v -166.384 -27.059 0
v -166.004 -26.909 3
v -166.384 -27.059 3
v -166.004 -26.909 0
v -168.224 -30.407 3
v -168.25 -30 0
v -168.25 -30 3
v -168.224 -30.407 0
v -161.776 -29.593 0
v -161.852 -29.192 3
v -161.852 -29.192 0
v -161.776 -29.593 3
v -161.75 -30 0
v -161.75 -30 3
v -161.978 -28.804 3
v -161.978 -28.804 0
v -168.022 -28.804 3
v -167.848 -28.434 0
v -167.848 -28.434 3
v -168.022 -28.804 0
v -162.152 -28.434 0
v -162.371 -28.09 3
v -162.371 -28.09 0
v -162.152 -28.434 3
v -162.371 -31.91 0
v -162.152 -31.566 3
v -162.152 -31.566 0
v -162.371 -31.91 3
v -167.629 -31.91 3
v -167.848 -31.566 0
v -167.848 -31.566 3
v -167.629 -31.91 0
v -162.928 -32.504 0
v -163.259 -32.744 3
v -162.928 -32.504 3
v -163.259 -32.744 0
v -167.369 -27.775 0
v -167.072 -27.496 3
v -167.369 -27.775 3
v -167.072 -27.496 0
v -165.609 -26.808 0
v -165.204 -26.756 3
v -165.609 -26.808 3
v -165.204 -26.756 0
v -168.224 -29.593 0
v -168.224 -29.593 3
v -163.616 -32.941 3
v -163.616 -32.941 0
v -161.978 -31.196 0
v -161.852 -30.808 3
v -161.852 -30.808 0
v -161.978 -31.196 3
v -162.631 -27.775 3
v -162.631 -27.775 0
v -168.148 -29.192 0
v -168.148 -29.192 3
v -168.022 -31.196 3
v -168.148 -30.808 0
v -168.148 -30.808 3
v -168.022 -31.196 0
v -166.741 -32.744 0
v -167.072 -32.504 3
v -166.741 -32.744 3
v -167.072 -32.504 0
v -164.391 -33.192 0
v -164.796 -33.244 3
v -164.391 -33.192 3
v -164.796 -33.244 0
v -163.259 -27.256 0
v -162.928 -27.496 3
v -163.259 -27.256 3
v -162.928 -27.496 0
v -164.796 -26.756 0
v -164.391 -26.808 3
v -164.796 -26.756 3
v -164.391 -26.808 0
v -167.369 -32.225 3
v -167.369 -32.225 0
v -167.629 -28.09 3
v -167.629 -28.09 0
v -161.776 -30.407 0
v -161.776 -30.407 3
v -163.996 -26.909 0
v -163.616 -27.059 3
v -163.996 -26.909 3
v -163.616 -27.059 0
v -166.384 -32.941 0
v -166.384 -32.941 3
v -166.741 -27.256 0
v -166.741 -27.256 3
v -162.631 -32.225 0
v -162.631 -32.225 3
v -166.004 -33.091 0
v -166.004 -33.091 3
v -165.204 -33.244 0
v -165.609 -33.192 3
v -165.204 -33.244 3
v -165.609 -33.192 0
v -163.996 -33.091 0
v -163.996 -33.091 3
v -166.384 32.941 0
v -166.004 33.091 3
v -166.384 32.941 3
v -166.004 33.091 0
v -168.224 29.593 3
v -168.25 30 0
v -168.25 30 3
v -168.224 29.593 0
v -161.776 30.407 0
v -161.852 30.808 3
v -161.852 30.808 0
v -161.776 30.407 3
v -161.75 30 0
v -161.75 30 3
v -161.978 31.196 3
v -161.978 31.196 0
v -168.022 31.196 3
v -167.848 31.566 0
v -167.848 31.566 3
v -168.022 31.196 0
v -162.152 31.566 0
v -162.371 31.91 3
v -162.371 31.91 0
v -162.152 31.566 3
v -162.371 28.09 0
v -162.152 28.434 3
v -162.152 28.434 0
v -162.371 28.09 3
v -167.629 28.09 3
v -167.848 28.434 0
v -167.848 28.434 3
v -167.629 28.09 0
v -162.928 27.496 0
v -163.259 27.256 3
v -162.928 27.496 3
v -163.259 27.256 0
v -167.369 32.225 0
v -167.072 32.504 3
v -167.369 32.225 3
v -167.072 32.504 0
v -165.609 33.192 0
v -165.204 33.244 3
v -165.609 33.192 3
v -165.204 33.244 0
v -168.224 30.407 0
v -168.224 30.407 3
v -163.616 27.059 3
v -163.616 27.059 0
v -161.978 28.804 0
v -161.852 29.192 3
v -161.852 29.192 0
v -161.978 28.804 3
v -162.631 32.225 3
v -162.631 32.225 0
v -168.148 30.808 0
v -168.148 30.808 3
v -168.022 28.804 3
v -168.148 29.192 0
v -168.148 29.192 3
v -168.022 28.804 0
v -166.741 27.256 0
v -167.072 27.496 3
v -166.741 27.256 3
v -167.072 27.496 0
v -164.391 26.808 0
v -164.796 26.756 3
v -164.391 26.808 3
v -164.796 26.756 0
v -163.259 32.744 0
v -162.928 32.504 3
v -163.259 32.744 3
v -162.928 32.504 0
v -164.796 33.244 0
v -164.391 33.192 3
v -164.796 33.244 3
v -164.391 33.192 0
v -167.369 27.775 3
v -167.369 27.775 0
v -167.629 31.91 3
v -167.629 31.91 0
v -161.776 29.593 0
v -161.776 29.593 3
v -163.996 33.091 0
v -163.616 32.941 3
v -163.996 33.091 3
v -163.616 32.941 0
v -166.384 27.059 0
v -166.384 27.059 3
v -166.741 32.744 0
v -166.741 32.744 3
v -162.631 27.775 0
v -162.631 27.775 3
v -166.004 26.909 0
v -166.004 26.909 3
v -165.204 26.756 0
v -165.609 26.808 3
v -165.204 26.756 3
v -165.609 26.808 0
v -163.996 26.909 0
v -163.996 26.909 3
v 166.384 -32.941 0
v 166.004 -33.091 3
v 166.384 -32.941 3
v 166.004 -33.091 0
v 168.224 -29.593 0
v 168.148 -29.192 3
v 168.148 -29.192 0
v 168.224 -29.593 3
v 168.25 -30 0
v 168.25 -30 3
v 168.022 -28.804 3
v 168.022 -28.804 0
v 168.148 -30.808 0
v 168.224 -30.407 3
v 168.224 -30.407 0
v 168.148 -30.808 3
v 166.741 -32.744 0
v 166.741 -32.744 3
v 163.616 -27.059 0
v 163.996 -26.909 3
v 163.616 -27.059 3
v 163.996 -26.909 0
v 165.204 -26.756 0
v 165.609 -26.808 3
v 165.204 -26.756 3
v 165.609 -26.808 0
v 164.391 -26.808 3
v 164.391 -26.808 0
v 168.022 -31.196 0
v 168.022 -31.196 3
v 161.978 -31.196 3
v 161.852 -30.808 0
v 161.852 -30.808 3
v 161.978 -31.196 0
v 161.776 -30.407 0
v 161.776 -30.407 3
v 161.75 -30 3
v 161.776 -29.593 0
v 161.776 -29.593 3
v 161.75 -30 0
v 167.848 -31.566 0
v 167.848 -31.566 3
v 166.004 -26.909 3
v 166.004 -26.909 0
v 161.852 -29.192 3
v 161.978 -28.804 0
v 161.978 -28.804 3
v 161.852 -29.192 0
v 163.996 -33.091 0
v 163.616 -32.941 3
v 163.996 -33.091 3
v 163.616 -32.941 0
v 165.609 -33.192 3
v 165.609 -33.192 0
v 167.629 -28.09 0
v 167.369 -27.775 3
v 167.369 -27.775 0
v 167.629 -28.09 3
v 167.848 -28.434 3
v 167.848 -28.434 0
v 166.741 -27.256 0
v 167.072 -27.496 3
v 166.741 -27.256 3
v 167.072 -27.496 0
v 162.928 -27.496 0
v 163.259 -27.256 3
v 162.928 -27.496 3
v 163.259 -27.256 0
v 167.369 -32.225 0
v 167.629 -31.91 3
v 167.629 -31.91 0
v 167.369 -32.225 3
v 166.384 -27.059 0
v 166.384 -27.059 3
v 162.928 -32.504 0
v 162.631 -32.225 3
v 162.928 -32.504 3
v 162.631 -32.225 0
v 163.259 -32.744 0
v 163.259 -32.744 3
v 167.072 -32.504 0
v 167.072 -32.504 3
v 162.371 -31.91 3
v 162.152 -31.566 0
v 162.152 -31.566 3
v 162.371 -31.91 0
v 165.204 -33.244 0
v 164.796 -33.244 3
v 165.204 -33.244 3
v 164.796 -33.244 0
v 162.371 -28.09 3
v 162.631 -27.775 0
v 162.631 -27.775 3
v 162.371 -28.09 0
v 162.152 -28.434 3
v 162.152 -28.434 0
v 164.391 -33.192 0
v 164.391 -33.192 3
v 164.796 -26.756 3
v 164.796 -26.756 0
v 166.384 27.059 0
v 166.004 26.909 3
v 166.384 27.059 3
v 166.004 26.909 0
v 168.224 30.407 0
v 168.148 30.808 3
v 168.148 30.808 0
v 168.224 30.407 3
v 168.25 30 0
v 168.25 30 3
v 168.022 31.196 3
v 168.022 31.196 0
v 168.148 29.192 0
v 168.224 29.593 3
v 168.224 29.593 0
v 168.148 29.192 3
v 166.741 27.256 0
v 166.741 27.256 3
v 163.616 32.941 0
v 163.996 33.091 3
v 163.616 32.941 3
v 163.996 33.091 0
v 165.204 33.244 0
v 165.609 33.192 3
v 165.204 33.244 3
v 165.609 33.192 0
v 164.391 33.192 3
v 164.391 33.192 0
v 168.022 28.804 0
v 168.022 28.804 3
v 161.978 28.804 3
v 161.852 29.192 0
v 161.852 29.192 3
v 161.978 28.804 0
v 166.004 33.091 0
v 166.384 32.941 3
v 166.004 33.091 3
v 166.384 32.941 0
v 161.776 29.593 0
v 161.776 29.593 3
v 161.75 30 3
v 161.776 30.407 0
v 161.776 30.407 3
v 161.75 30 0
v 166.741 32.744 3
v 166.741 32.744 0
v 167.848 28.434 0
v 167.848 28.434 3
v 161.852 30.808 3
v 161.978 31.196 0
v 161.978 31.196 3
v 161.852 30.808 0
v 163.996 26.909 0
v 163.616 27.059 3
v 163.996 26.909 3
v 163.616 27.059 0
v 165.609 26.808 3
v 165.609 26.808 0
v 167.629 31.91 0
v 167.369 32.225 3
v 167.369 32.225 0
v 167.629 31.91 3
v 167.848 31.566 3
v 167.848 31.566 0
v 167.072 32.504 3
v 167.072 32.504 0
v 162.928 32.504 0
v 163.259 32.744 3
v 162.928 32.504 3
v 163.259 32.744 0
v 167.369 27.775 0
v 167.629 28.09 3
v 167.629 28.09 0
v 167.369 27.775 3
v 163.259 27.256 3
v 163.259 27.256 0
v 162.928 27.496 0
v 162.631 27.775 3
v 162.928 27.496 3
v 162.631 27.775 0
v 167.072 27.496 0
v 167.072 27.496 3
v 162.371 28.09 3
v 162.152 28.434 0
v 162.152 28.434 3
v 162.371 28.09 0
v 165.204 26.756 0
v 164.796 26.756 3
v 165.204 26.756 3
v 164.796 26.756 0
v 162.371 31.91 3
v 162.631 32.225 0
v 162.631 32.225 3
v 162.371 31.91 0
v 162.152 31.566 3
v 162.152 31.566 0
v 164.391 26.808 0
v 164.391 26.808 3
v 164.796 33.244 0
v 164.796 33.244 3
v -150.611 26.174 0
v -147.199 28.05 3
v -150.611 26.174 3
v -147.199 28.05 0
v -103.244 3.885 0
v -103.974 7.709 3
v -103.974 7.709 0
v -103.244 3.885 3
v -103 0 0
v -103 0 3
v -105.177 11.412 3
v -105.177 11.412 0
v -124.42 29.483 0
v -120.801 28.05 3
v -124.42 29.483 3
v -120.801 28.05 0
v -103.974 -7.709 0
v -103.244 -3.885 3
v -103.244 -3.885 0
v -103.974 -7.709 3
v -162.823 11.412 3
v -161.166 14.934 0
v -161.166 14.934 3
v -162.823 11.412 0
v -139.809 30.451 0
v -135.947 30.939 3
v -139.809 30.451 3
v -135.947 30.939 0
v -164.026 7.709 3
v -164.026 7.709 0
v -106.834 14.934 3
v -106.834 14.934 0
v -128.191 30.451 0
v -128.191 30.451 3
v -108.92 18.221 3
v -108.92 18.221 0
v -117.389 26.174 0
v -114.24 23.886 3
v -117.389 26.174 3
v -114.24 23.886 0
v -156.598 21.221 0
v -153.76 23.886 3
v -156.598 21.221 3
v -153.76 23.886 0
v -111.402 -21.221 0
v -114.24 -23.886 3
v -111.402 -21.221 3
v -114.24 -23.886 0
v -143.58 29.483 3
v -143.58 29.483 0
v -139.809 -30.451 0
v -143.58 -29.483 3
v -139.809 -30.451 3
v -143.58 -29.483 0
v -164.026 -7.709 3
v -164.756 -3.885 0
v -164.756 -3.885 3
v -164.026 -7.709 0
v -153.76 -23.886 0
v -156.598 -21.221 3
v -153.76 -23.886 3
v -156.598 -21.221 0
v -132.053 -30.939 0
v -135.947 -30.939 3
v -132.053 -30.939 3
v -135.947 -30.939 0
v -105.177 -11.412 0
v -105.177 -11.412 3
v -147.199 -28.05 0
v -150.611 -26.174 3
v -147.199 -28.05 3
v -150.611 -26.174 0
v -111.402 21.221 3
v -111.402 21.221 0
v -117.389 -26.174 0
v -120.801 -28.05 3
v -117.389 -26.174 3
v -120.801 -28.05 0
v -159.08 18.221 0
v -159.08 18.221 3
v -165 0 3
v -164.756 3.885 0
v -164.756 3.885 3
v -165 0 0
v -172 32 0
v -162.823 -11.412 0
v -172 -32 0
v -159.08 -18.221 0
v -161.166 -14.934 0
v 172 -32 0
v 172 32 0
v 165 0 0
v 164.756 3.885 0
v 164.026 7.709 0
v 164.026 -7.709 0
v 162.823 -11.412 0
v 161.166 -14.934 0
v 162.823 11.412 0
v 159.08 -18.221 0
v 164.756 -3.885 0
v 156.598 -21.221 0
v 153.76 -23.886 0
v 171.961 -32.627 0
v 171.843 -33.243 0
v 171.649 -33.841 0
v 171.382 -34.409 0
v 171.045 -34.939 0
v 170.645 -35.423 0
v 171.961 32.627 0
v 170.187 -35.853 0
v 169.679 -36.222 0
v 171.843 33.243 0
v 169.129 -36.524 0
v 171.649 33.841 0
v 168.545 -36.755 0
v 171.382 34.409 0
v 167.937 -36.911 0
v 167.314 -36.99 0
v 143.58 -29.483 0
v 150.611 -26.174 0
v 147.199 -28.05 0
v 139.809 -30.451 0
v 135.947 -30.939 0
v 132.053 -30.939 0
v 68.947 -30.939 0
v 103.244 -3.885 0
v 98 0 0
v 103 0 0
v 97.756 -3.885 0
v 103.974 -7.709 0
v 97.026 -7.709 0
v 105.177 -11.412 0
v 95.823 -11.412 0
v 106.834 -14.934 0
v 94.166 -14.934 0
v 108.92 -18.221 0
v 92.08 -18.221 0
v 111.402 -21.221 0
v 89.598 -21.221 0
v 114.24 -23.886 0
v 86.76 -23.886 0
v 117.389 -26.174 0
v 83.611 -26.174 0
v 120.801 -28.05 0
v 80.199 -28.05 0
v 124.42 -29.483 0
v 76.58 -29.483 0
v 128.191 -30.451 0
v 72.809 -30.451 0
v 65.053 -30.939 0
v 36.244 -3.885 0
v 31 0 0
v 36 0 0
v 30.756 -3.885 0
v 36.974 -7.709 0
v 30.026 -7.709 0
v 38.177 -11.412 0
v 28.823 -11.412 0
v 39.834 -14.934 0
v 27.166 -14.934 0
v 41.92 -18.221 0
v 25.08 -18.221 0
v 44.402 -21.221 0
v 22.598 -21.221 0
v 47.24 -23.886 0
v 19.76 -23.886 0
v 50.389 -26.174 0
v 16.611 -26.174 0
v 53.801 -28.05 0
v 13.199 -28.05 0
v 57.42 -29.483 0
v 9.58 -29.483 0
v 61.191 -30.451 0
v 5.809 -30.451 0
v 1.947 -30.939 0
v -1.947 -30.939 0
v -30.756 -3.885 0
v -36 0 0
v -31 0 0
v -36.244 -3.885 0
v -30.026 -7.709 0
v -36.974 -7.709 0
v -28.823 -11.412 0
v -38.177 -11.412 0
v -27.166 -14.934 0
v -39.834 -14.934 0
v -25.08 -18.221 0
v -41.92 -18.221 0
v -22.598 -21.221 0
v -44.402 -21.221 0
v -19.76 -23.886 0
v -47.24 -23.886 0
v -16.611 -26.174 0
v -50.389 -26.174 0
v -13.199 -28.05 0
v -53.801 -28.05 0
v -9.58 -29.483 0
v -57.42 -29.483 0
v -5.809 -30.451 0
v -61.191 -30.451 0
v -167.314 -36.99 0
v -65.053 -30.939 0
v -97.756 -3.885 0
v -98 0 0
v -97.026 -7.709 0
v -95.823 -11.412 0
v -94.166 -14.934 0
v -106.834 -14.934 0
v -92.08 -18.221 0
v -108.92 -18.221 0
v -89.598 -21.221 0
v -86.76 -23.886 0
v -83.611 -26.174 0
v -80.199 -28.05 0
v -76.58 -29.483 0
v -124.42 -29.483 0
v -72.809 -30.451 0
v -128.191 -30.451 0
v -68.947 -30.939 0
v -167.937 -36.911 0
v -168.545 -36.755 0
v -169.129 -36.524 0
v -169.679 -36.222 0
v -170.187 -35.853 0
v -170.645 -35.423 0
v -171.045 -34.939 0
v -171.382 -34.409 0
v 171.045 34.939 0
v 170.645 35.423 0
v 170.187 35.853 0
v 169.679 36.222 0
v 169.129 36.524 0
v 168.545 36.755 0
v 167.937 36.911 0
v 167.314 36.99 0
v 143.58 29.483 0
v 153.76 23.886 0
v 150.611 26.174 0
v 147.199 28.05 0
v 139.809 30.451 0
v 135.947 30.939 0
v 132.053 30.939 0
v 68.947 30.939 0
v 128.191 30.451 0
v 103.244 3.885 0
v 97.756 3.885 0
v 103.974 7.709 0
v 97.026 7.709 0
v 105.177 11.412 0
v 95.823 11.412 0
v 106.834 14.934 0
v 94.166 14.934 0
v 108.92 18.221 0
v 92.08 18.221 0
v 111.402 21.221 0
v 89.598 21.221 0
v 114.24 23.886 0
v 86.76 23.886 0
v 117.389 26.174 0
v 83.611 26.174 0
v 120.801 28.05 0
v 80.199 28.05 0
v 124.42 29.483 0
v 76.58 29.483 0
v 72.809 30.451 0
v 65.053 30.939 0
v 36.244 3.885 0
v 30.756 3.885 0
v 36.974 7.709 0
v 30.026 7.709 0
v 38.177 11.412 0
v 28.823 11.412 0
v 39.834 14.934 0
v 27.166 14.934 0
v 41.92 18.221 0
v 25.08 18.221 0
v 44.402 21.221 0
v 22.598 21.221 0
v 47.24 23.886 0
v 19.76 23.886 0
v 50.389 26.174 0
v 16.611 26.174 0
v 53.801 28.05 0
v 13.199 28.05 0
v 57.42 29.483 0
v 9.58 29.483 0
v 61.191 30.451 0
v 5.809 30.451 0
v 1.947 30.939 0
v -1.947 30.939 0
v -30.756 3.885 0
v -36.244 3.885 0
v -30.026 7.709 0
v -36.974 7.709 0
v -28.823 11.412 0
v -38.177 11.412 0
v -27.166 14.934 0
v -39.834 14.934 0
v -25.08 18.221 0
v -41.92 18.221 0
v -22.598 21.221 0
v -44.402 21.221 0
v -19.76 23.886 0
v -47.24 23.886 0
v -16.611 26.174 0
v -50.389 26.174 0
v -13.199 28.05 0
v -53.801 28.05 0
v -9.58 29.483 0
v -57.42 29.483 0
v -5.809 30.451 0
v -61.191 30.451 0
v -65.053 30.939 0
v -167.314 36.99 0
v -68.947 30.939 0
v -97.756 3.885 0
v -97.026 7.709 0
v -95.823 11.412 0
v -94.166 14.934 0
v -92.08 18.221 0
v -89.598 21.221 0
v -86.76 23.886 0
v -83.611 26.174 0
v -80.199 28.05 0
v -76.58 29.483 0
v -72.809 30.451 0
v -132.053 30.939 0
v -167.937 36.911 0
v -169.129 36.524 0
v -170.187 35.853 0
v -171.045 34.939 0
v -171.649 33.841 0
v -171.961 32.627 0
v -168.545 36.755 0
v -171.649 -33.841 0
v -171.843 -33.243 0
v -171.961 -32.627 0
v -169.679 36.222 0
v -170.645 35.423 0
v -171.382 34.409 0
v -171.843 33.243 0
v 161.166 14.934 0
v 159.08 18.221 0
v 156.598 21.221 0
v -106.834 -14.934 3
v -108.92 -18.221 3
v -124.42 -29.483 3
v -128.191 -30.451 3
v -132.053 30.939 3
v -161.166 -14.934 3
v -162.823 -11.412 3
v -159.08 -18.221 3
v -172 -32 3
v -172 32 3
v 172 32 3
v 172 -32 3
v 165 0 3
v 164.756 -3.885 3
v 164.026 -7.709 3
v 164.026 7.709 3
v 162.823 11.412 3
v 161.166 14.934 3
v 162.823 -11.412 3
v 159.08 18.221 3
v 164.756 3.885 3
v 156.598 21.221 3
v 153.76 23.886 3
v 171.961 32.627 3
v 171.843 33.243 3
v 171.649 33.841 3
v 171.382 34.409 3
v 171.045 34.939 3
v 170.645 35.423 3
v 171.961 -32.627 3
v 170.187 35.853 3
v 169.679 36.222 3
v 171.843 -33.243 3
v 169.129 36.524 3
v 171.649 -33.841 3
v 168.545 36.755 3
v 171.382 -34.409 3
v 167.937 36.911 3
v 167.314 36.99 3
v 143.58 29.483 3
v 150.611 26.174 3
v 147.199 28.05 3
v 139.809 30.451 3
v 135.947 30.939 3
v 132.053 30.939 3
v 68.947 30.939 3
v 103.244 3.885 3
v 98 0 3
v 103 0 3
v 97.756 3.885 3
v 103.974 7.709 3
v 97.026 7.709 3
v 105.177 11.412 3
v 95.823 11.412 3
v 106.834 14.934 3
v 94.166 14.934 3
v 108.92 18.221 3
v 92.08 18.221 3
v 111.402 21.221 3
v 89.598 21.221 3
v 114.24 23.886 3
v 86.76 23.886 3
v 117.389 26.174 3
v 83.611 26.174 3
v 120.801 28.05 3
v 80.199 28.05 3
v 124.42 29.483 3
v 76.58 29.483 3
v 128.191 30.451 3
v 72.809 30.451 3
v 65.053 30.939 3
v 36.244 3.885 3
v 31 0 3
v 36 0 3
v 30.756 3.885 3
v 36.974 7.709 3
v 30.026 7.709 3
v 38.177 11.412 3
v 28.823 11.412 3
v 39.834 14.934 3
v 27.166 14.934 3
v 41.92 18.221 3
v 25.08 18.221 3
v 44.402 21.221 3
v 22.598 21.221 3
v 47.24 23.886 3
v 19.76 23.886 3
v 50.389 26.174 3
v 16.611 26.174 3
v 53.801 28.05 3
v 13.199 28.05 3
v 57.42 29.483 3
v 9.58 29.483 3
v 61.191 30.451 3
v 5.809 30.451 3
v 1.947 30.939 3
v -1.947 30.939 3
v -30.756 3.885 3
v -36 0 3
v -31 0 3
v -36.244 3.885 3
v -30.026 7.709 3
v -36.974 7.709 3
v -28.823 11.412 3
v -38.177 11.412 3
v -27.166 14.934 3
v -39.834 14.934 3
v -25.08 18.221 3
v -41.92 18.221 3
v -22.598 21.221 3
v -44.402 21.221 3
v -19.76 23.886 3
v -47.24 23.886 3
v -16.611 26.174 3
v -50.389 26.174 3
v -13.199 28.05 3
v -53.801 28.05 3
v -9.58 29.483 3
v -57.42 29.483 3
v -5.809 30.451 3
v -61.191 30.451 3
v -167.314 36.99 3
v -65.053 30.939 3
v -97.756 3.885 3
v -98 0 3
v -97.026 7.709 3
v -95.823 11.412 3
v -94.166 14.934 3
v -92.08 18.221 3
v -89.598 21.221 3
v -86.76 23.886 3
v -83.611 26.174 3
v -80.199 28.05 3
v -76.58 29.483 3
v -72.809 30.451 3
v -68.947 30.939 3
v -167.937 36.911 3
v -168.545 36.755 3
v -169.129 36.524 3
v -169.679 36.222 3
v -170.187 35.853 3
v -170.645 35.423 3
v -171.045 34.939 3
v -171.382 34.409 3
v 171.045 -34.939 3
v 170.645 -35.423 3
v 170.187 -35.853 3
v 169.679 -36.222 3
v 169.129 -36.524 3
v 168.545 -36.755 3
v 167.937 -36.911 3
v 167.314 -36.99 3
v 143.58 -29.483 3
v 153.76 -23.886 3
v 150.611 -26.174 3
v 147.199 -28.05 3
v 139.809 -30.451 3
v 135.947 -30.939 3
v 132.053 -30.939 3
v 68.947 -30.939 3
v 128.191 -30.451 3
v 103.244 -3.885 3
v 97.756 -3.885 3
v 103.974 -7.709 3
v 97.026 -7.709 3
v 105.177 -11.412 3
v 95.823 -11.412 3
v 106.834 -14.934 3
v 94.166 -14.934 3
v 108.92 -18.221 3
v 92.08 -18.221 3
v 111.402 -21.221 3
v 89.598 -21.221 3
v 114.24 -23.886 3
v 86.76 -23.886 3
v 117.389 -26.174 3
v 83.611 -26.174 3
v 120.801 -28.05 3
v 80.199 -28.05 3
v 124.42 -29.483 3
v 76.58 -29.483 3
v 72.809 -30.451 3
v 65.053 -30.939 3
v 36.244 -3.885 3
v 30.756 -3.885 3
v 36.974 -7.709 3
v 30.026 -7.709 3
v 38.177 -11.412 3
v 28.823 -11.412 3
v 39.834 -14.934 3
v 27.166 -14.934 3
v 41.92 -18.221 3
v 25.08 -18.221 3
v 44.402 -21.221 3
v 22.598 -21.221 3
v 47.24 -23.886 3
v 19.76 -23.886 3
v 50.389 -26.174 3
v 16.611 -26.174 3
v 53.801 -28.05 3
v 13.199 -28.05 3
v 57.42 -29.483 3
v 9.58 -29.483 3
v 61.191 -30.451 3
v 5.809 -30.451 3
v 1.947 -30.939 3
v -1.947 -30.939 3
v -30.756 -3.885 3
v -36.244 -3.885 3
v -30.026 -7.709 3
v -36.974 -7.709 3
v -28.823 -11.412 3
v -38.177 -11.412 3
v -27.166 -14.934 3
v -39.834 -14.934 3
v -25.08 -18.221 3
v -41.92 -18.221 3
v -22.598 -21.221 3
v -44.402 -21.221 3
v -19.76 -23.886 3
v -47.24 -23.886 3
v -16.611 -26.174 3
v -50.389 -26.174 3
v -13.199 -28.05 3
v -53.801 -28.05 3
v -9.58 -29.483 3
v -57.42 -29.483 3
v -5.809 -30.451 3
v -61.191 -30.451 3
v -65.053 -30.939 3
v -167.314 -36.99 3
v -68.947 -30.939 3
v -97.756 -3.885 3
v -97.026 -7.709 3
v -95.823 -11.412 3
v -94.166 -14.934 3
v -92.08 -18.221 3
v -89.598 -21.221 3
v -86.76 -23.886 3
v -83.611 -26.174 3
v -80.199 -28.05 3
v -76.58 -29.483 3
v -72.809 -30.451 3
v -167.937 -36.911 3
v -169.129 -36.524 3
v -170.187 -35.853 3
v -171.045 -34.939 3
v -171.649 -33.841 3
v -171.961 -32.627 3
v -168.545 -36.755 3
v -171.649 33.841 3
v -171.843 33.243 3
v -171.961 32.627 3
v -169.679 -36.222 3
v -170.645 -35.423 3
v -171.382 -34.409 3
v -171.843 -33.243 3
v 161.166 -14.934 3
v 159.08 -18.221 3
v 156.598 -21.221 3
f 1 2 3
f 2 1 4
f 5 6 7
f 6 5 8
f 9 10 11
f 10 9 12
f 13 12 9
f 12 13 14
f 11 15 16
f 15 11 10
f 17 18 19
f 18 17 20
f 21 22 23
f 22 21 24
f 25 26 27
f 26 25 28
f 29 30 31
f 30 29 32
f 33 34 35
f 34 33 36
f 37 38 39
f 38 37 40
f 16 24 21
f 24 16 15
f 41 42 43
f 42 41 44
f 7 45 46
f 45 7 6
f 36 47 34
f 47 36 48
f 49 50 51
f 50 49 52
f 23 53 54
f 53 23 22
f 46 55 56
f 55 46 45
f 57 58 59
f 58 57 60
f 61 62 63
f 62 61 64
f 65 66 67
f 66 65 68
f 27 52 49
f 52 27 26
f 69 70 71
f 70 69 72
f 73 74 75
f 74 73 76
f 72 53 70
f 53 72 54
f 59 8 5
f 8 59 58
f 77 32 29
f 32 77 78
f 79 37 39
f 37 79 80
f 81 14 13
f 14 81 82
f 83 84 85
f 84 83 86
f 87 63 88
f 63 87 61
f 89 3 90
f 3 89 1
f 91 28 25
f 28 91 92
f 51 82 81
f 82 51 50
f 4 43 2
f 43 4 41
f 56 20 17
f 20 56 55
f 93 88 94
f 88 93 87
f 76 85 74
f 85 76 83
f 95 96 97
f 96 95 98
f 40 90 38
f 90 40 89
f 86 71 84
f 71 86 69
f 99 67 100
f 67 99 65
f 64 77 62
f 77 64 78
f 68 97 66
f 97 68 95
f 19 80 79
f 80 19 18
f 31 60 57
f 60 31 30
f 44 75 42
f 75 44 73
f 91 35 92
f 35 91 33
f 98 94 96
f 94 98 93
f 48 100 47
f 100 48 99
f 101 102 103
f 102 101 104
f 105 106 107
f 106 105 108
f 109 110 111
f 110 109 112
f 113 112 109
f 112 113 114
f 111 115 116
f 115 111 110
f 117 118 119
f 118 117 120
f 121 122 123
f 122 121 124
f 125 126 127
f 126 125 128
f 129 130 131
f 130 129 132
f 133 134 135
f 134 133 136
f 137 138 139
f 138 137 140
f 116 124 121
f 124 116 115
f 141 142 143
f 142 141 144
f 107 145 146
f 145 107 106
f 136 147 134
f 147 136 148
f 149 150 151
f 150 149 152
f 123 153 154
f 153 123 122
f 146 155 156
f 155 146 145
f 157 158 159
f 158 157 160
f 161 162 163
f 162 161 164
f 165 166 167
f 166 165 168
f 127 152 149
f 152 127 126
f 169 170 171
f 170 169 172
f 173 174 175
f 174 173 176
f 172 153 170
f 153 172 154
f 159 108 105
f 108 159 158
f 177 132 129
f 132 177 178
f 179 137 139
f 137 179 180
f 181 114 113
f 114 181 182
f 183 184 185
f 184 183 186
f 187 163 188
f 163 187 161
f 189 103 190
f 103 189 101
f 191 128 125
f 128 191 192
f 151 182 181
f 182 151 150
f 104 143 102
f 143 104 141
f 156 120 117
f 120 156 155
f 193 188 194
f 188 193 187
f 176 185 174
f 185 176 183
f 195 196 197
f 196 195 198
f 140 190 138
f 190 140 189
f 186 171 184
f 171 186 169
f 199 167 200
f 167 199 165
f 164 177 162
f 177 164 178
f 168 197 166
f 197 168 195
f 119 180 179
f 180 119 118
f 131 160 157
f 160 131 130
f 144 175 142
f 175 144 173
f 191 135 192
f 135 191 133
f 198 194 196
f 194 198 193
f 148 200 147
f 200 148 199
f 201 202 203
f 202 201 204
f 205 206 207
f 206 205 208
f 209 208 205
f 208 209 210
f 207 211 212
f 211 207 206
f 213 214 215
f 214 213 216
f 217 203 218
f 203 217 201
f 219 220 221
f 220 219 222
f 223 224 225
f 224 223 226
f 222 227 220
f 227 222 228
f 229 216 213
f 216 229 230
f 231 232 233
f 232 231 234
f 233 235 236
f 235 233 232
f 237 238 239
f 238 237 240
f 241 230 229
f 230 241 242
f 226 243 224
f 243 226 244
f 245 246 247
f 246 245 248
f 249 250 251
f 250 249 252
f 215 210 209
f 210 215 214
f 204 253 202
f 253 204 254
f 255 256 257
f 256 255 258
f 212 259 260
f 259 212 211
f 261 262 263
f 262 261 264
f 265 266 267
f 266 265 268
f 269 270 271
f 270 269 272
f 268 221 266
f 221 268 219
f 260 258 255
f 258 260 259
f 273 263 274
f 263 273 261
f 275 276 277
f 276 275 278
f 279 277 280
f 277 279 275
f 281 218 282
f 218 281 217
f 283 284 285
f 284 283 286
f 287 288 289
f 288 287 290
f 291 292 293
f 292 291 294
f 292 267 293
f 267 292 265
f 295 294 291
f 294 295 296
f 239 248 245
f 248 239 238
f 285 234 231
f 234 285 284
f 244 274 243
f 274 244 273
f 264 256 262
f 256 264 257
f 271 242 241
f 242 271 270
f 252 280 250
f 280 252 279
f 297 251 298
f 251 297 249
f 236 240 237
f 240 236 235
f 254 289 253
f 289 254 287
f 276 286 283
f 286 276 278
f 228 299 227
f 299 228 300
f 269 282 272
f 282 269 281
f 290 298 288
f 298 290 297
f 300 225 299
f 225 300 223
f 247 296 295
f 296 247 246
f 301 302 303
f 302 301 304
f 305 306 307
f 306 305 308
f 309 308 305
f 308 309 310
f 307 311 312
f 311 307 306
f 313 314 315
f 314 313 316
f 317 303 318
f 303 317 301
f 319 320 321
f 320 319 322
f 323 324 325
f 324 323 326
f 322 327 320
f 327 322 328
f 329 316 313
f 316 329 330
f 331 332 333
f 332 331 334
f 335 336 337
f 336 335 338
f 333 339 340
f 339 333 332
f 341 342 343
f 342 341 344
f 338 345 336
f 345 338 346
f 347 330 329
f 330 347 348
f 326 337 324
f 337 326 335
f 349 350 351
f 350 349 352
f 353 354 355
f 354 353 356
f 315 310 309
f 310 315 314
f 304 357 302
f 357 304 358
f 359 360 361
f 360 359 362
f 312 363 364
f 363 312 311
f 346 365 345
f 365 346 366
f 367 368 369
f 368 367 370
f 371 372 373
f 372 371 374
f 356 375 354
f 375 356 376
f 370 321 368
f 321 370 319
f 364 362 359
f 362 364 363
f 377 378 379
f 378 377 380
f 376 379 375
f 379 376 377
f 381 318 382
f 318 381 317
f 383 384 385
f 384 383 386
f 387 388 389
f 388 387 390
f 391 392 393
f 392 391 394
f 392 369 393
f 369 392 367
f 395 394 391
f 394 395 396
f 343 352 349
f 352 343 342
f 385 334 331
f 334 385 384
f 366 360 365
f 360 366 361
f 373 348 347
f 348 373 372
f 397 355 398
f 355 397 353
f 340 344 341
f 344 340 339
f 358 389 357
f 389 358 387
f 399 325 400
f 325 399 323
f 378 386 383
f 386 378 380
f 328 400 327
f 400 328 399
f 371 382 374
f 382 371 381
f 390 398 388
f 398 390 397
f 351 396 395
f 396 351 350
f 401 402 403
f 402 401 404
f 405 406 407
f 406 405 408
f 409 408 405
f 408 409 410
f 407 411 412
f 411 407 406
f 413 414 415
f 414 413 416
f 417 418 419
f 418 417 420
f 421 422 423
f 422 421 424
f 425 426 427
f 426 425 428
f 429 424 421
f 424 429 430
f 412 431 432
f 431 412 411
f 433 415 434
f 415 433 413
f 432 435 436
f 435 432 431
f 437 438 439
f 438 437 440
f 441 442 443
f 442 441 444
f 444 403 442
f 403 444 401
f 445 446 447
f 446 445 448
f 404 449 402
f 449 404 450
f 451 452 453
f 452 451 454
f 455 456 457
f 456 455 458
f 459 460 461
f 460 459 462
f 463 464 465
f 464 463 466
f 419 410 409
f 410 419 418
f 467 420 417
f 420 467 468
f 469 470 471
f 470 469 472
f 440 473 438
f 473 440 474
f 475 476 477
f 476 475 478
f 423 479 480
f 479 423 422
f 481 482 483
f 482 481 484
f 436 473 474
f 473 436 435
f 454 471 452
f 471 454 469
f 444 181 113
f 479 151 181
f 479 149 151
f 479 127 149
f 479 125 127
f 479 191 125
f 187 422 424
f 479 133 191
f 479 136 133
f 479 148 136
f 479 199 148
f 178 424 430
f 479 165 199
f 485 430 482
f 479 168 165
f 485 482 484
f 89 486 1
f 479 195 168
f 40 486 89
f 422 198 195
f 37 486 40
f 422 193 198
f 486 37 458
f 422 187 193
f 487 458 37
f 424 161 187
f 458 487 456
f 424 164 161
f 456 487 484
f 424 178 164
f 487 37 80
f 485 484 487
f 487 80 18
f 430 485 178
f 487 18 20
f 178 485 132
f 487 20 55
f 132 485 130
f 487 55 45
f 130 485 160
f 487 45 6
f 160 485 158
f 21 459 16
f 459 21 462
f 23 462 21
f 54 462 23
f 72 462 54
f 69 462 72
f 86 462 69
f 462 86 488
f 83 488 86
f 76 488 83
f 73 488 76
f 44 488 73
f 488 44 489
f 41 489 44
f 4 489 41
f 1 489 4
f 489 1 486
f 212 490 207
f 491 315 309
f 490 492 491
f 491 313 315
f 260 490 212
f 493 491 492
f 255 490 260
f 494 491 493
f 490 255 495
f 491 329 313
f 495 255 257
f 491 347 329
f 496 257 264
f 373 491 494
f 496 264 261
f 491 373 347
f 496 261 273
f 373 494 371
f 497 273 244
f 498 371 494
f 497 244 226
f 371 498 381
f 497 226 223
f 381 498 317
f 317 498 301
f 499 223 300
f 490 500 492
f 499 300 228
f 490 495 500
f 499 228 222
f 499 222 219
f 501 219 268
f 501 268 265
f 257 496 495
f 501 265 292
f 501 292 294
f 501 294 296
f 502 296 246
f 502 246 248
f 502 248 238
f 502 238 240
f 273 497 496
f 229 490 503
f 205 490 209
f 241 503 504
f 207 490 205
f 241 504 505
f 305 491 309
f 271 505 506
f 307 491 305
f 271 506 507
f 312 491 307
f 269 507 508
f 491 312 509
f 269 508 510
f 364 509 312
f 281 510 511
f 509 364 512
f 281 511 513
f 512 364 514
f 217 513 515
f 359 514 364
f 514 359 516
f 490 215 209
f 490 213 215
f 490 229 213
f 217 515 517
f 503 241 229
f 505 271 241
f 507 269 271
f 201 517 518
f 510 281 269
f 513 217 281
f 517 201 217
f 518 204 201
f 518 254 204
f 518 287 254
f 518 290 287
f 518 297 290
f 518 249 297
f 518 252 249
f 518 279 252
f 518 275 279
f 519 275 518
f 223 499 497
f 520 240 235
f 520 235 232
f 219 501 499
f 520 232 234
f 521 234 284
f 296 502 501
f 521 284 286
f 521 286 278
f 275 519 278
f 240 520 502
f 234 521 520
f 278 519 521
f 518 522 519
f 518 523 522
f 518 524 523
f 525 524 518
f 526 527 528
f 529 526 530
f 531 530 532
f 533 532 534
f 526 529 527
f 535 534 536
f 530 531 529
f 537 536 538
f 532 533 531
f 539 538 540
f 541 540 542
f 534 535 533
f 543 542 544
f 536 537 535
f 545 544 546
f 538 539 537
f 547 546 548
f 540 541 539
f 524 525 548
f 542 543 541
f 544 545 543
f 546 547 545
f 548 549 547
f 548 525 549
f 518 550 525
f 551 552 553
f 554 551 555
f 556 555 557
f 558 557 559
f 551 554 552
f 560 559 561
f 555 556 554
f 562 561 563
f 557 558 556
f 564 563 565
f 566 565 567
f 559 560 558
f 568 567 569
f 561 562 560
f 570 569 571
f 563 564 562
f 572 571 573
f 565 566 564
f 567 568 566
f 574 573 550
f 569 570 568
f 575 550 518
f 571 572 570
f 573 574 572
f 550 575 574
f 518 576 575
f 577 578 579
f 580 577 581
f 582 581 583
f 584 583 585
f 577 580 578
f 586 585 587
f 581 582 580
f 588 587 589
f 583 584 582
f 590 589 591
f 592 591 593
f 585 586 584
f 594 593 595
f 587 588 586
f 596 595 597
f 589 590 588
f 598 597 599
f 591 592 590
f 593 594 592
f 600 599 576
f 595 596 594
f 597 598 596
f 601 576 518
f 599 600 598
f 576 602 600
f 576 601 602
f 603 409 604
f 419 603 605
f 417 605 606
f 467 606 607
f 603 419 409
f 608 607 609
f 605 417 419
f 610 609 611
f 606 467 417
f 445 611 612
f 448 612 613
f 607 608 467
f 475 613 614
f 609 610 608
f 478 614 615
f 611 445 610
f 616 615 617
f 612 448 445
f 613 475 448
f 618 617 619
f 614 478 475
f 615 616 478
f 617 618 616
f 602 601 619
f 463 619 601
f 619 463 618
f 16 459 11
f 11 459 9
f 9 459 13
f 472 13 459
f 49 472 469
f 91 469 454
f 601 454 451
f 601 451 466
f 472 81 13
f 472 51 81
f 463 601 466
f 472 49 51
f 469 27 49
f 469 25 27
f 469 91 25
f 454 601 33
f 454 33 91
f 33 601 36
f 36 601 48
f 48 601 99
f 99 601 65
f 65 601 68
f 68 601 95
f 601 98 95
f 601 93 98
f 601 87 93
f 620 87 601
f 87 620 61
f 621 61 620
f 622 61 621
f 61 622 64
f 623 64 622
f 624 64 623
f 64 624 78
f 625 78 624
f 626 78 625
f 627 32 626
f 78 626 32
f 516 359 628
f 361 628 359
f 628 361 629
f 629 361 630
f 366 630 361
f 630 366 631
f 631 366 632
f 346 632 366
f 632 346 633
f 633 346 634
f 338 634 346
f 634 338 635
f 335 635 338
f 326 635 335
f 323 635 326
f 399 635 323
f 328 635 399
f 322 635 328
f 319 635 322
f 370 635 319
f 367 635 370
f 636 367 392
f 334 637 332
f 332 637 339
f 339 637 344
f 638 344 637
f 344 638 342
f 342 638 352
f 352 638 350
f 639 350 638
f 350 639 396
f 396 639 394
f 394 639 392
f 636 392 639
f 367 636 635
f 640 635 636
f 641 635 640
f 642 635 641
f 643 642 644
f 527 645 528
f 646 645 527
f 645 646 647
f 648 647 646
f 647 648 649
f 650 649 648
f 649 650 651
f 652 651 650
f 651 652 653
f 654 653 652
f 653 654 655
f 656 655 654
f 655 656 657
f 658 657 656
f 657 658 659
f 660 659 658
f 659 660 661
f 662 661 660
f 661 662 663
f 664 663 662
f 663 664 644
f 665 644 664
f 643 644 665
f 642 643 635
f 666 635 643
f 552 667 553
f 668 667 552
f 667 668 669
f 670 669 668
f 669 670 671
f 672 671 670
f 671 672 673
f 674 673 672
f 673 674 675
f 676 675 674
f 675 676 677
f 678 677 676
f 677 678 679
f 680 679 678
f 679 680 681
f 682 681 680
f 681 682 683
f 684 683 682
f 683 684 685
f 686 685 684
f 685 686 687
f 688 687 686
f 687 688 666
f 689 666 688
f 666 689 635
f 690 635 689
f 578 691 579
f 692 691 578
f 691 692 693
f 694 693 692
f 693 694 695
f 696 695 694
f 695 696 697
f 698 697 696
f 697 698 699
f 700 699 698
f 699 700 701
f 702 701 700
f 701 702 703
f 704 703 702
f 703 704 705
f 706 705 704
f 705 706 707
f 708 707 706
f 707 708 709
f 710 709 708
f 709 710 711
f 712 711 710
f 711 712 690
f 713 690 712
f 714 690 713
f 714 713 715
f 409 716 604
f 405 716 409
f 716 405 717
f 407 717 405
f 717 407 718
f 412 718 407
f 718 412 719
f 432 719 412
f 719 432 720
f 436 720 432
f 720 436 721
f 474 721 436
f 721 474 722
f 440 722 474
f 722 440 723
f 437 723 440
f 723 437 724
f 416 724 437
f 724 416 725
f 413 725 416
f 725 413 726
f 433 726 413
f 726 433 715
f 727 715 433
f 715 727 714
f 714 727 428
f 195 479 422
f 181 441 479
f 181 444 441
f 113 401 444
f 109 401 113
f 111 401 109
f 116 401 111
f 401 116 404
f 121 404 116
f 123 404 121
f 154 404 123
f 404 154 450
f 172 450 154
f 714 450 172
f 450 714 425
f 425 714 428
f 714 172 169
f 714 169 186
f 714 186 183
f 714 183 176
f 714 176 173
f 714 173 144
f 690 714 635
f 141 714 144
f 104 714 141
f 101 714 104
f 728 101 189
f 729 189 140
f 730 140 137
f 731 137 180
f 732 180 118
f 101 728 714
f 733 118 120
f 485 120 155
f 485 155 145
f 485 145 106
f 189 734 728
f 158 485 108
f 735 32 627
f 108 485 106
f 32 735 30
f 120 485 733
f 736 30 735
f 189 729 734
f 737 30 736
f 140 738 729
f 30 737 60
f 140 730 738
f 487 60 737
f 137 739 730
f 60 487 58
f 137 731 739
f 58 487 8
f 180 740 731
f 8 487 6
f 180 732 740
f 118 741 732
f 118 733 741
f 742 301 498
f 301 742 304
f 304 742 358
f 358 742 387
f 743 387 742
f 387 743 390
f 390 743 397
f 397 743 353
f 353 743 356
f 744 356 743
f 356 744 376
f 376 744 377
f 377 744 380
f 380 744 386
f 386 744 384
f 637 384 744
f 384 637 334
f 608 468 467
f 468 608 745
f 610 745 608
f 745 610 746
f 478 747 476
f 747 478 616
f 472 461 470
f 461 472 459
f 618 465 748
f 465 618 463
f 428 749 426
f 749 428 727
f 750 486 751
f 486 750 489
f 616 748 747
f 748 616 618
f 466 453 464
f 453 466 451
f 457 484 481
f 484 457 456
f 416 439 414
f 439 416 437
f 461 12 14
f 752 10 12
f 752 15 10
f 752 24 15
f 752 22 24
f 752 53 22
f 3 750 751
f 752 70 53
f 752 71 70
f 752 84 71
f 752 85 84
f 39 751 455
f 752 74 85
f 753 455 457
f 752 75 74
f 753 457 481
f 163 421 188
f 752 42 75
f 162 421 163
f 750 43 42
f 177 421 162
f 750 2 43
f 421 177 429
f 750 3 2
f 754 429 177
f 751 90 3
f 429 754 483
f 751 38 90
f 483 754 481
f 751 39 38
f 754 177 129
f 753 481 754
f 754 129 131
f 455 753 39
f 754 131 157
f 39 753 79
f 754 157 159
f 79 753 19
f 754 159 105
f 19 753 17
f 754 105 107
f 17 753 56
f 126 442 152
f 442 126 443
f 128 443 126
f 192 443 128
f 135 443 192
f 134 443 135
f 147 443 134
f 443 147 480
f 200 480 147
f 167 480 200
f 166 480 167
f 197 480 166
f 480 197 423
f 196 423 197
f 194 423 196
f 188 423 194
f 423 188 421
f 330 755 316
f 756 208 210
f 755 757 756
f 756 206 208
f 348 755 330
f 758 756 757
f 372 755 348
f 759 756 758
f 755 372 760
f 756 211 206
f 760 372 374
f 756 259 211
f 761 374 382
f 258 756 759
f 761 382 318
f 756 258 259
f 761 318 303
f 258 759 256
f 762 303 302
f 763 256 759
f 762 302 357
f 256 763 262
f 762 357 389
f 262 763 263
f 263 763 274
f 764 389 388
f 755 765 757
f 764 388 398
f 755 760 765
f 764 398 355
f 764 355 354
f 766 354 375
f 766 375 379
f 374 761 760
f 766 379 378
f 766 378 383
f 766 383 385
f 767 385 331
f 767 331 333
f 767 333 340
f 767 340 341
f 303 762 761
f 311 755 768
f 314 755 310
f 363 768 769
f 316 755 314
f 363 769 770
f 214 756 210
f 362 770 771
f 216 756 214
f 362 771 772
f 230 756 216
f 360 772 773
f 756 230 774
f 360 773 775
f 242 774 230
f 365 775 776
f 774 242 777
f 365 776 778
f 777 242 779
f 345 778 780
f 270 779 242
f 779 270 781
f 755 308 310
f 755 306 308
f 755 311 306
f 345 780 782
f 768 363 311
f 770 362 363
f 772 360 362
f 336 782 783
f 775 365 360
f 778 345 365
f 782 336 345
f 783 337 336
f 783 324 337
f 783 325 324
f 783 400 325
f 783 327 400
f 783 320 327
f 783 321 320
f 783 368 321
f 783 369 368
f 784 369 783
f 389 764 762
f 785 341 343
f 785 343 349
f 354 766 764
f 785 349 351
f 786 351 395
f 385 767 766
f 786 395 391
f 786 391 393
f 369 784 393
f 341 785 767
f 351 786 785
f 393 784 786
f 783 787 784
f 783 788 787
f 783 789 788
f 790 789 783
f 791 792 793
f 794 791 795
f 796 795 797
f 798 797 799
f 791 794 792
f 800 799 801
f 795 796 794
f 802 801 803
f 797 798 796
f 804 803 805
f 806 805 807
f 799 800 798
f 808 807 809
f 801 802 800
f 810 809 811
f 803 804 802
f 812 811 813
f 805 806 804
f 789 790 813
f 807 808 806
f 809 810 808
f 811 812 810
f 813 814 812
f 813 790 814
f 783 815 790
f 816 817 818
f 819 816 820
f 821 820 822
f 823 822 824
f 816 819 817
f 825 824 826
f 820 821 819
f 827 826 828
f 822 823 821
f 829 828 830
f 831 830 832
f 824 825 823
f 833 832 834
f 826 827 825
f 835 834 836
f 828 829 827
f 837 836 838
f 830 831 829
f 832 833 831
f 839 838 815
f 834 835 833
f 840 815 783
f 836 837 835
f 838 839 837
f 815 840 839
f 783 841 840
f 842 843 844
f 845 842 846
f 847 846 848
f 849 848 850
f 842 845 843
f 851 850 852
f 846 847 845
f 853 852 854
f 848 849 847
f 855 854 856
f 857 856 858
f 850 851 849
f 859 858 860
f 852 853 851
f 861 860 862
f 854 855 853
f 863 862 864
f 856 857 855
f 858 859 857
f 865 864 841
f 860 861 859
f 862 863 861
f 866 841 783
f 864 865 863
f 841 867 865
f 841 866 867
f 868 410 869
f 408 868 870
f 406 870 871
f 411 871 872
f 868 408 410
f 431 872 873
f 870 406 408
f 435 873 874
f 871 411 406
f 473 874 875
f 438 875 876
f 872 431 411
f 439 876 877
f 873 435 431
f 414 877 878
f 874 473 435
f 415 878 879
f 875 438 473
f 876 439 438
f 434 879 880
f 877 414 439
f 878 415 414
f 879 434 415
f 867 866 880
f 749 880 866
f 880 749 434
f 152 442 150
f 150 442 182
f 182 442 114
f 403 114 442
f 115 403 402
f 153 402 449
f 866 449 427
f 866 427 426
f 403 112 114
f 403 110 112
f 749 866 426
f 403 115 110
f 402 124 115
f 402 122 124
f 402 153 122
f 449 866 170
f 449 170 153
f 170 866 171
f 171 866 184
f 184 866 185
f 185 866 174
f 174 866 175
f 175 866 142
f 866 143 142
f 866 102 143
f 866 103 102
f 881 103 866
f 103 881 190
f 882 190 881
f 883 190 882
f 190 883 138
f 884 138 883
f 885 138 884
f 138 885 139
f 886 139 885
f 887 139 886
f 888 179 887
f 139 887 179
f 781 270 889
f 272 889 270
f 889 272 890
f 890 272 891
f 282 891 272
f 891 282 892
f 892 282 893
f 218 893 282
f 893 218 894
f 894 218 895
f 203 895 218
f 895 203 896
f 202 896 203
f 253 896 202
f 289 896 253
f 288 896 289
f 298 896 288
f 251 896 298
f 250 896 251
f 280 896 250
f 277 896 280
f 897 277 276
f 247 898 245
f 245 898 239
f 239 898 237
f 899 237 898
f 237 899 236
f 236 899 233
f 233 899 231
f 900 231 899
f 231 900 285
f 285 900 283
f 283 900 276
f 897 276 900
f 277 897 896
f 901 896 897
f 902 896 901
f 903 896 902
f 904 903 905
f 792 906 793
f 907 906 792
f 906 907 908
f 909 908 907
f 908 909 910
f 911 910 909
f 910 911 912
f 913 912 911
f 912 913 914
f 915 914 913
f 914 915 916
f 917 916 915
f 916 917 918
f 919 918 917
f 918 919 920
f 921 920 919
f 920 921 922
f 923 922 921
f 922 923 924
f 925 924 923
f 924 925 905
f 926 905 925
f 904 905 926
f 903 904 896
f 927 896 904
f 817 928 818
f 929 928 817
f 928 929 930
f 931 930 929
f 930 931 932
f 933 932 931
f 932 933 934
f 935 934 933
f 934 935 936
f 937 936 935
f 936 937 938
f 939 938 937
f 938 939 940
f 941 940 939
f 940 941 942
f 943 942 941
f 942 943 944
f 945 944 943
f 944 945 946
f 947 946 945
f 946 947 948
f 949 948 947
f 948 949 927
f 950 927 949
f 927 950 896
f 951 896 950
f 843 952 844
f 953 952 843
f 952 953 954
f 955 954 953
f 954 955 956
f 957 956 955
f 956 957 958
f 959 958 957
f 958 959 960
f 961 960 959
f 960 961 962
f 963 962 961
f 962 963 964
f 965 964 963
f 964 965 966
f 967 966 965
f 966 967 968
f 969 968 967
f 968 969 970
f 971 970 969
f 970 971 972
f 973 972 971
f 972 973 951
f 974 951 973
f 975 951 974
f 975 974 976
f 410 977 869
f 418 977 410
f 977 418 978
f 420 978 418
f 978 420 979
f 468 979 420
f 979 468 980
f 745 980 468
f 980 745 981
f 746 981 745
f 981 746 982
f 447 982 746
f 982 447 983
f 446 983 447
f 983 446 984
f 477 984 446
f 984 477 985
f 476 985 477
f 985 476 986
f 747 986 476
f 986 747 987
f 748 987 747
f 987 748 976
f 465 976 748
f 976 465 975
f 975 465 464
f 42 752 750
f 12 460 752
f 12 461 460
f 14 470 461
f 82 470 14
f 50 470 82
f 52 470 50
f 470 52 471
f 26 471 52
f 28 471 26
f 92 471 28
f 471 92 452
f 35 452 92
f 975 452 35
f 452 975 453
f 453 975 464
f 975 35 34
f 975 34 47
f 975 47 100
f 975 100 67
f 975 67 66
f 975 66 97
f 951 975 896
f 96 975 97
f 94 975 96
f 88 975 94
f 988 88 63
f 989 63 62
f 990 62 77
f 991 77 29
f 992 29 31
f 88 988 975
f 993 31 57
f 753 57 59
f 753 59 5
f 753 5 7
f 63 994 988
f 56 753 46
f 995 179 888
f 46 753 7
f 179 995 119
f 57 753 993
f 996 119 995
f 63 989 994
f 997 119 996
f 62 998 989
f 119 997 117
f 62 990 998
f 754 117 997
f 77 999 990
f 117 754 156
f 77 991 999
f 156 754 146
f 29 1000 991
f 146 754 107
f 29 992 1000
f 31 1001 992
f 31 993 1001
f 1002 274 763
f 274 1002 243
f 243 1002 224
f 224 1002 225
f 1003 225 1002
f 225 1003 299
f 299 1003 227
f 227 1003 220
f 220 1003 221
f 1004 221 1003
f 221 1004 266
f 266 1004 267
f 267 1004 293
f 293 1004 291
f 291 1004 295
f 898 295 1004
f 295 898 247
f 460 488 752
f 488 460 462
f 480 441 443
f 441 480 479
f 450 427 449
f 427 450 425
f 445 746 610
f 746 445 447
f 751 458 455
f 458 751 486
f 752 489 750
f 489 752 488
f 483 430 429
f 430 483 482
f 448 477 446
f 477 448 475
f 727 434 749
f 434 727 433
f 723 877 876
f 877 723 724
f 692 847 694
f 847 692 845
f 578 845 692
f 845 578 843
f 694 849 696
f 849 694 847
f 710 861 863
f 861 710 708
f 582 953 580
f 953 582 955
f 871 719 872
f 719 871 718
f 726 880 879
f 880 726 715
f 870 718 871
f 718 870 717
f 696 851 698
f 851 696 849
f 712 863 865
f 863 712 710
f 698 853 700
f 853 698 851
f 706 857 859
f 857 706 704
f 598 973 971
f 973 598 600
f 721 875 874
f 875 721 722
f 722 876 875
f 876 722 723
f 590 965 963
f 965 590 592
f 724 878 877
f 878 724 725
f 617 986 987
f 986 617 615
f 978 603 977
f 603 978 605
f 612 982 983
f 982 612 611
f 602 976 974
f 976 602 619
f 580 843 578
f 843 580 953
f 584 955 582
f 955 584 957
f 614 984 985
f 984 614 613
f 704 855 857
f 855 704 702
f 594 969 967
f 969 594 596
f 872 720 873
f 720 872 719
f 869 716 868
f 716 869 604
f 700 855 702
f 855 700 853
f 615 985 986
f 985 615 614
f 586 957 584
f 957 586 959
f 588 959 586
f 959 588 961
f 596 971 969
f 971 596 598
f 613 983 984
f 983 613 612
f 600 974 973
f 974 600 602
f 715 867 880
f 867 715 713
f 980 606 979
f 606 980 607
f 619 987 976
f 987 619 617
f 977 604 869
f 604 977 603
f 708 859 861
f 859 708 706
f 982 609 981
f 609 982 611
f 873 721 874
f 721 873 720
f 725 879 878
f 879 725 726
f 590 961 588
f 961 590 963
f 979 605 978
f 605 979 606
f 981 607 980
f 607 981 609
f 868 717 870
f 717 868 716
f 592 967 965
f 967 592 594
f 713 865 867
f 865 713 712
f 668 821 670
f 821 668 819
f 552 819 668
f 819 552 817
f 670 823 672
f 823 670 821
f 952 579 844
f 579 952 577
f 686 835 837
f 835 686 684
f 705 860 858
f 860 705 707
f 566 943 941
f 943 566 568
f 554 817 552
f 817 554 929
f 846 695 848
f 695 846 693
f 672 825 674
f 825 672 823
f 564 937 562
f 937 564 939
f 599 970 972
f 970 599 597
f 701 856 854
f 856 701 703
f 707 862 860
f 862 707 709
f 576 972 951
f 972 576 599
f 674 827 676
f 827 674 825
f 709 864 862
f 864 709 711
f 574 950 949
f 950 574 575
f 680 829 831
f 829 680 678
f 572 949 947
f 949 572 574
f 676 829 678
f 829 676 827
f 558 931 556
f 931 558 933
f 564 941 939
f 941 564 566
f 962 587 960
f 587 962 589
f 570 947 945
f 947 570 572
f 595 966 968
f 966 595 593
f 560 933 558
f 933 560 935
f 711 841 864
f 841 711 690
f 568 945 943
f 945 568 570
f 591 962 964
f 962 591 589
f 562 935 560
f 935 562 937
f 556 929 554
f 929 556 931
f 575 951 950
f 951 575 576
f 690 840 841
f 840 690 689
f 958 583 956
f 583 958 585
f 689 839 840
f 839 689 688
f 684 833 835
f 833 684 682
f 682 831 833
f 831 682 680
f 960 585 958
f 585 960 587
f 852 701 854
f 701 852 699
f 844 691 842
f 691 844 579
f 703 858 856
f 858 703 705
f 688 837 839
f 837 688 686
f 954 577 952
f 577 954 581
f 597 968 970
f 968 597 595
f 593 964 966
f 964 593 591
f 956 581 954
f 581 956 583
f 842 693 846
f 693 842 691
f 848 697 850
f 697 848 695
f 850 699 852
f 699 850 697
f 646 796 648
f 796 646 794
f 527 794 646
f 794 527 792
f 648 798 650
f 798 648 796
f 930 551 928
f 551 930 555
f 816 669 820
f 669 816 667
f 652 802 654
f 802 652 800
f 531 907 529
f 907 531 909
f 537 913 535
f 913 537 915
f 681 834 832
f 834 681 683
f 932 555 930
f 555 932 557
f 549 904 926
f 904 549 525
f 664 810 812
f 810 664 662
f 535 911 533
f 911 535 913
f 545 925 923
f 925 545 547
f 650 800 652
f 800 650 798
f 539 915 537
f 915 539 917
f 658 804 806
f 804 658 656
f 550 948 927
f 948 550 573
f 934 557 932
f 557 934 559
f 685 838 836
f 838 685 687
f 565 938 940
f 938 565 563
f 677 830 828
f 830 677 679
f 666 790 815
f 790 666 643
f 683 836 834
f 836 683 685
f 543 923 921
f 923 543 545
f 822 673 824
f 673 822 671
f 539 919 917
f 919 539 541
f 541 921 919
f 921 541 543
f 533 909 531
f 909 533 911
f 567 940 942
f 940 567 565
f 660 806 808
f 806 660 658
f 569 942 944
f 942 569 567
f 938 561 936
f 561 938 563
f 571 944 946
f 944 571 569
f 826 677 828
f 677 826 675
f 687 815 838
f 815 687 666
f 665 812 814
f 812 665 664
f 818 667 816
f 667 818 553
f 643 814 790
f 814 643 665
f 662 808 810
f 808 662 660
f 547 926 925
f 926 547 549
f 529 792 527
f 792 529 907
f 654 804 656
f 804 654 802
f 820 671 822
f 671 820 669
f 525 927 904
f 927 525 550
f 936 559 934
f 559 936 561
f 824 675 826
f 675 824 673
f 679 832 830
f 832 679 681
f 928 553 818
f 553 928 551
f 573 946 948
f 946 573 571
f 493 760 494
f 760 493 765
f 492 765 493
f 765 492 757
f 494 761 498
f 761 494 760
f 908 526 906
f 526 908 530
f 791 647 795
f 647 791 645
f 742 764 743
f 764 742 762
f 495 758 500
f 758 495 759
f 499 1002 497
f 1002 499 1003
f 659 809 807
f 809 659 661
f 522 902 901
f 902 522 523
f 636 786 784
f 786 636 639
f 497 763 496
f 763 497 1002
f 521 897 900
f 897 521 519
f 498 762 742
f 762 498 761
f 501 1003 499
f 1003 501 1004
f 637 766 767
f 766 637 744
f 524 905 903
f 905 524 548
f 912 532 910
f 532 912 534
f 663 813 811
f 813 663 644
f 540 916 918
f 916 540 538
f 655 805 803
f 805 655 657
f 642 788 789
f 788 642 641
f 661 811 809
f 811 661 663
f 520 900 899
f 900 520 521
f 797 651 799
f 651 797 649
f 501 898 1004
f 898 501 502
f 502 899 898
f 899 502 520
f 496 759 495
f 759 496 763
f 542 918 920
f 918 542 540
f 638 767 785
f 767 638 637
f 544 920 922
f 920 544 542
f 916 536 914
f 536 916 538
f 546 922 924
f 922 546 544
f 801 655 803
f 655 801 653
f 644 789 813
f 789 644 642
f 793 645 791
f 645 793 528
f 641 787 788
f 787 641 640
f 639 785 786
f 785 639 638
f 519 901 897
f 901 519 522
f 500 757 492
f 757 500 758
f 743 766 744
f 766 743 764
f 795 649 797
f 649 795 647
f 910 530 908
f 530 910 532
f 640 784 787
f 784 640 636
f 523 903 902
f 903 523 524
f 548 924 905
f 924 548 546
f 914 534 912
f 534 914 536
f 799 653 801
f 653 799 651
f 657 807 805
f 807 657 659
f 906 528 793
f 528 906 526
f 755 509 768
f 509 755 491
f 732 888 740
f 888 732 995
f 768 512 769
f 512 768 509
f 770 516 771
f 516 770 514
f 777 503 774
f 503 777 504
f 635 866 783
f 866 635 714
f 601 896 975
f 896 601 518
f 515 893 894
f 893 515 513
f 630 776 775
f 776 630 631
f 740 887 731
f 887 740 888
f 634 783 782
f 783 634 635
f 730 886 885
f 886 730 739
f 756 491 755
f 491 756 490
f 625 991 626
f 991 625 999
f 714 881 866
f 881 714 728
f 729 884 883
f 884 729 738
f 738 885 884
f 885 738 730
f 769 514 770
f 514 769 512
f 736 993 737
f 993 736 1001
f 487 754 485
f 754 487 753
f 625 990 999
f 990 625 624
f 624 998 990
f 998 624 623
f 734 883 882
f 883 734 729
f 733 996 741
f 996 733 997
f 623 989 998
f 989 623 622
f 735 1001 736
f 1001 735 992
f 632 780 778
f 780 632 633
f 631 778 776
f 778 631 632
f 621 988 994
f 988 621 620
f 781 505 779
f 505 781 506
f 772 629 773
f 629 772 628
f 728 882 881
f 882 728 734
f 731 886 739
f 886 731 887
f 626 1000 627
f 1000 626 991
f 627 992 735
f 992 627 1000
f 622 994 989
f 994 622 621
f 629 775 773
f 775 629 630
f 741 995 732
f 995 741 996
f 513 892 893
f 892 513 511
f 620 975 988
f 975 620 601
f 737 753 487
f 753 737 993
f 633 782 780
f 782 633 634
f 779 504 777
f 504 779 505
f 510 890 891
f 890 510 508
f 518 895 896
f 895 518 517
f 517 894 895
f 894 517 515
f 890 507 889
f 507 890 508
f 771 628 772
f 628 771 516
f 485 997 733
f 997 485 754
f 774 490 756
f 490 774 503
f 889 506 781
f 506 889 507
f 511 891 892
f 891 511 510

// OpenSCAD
$fn = 50;

difference() {
	union() {
		hull() {
			translate(v = [-167.0, 32.0, 0]) {
				cylinder(h = 3, r = 5);
			}
			translate(v = [167.0, 32.0, 0]) {
				cylinder(h = 3, r = 5);
			}
			translate(v = [-167.0, -32.0, 0]) {
				cylinder(h = 3, r = 5);
			}
			translate(v = [167.0, -32.0, 0]) {
				cylinder(h = 3, r = 5);
			}
		}
	}
	union() {
		translate(v = [-165.0, -30.0, -100.0]) {
			cylinder(h = 200, r = 3.25);
		}
		translate(v = [-165.0, 30.0, -100.0]) {
			cylinder(h = 200, r = 3.25);
		}
		translate(v = [165.0, -30.0, -100.0]) {
			cylinder(h = 200, r = 3.25);
		}
		translate(v = [165.0, 30.0, -100.0]) {
			cylinder(h = 200, r = 3.25);
		}
		translate(v = [-165.0, -30.0, -100.0]) {
			cylinder(h = 200, r = 1.8);
		}
		translate(v = [-165.0, 30.0, -100.0]) {
			cylinder(h = 200, r = 1.8);
		}
		translate(v = [165.0, -30.0, -100.0]) {
			cylinder(h = 200, r = 1.8);
		}
		translate(v = [165.0, 30.0, -100.0]) {
			cylinder(h = 200, r = 1.8);
		}
		translate(v = [-134.0, 0, 0.0]) {
			cylinder(h = 3, r = 31.0);
		}
		translate(v = [-67.0, 0, 0.0]) {
			cylinder(h = 3, r = 31.0);
		}
		cylinder(h = 3, r = 31.0);
		translate(v = [67.0, 0, 0.0]) {
			cylinder(h = 3, r = 31.0);
		}
		translate(v = [134.0, 0, 0.0]) {
			cylinder(h = 3, r = 31.0);
		}
	}
}
